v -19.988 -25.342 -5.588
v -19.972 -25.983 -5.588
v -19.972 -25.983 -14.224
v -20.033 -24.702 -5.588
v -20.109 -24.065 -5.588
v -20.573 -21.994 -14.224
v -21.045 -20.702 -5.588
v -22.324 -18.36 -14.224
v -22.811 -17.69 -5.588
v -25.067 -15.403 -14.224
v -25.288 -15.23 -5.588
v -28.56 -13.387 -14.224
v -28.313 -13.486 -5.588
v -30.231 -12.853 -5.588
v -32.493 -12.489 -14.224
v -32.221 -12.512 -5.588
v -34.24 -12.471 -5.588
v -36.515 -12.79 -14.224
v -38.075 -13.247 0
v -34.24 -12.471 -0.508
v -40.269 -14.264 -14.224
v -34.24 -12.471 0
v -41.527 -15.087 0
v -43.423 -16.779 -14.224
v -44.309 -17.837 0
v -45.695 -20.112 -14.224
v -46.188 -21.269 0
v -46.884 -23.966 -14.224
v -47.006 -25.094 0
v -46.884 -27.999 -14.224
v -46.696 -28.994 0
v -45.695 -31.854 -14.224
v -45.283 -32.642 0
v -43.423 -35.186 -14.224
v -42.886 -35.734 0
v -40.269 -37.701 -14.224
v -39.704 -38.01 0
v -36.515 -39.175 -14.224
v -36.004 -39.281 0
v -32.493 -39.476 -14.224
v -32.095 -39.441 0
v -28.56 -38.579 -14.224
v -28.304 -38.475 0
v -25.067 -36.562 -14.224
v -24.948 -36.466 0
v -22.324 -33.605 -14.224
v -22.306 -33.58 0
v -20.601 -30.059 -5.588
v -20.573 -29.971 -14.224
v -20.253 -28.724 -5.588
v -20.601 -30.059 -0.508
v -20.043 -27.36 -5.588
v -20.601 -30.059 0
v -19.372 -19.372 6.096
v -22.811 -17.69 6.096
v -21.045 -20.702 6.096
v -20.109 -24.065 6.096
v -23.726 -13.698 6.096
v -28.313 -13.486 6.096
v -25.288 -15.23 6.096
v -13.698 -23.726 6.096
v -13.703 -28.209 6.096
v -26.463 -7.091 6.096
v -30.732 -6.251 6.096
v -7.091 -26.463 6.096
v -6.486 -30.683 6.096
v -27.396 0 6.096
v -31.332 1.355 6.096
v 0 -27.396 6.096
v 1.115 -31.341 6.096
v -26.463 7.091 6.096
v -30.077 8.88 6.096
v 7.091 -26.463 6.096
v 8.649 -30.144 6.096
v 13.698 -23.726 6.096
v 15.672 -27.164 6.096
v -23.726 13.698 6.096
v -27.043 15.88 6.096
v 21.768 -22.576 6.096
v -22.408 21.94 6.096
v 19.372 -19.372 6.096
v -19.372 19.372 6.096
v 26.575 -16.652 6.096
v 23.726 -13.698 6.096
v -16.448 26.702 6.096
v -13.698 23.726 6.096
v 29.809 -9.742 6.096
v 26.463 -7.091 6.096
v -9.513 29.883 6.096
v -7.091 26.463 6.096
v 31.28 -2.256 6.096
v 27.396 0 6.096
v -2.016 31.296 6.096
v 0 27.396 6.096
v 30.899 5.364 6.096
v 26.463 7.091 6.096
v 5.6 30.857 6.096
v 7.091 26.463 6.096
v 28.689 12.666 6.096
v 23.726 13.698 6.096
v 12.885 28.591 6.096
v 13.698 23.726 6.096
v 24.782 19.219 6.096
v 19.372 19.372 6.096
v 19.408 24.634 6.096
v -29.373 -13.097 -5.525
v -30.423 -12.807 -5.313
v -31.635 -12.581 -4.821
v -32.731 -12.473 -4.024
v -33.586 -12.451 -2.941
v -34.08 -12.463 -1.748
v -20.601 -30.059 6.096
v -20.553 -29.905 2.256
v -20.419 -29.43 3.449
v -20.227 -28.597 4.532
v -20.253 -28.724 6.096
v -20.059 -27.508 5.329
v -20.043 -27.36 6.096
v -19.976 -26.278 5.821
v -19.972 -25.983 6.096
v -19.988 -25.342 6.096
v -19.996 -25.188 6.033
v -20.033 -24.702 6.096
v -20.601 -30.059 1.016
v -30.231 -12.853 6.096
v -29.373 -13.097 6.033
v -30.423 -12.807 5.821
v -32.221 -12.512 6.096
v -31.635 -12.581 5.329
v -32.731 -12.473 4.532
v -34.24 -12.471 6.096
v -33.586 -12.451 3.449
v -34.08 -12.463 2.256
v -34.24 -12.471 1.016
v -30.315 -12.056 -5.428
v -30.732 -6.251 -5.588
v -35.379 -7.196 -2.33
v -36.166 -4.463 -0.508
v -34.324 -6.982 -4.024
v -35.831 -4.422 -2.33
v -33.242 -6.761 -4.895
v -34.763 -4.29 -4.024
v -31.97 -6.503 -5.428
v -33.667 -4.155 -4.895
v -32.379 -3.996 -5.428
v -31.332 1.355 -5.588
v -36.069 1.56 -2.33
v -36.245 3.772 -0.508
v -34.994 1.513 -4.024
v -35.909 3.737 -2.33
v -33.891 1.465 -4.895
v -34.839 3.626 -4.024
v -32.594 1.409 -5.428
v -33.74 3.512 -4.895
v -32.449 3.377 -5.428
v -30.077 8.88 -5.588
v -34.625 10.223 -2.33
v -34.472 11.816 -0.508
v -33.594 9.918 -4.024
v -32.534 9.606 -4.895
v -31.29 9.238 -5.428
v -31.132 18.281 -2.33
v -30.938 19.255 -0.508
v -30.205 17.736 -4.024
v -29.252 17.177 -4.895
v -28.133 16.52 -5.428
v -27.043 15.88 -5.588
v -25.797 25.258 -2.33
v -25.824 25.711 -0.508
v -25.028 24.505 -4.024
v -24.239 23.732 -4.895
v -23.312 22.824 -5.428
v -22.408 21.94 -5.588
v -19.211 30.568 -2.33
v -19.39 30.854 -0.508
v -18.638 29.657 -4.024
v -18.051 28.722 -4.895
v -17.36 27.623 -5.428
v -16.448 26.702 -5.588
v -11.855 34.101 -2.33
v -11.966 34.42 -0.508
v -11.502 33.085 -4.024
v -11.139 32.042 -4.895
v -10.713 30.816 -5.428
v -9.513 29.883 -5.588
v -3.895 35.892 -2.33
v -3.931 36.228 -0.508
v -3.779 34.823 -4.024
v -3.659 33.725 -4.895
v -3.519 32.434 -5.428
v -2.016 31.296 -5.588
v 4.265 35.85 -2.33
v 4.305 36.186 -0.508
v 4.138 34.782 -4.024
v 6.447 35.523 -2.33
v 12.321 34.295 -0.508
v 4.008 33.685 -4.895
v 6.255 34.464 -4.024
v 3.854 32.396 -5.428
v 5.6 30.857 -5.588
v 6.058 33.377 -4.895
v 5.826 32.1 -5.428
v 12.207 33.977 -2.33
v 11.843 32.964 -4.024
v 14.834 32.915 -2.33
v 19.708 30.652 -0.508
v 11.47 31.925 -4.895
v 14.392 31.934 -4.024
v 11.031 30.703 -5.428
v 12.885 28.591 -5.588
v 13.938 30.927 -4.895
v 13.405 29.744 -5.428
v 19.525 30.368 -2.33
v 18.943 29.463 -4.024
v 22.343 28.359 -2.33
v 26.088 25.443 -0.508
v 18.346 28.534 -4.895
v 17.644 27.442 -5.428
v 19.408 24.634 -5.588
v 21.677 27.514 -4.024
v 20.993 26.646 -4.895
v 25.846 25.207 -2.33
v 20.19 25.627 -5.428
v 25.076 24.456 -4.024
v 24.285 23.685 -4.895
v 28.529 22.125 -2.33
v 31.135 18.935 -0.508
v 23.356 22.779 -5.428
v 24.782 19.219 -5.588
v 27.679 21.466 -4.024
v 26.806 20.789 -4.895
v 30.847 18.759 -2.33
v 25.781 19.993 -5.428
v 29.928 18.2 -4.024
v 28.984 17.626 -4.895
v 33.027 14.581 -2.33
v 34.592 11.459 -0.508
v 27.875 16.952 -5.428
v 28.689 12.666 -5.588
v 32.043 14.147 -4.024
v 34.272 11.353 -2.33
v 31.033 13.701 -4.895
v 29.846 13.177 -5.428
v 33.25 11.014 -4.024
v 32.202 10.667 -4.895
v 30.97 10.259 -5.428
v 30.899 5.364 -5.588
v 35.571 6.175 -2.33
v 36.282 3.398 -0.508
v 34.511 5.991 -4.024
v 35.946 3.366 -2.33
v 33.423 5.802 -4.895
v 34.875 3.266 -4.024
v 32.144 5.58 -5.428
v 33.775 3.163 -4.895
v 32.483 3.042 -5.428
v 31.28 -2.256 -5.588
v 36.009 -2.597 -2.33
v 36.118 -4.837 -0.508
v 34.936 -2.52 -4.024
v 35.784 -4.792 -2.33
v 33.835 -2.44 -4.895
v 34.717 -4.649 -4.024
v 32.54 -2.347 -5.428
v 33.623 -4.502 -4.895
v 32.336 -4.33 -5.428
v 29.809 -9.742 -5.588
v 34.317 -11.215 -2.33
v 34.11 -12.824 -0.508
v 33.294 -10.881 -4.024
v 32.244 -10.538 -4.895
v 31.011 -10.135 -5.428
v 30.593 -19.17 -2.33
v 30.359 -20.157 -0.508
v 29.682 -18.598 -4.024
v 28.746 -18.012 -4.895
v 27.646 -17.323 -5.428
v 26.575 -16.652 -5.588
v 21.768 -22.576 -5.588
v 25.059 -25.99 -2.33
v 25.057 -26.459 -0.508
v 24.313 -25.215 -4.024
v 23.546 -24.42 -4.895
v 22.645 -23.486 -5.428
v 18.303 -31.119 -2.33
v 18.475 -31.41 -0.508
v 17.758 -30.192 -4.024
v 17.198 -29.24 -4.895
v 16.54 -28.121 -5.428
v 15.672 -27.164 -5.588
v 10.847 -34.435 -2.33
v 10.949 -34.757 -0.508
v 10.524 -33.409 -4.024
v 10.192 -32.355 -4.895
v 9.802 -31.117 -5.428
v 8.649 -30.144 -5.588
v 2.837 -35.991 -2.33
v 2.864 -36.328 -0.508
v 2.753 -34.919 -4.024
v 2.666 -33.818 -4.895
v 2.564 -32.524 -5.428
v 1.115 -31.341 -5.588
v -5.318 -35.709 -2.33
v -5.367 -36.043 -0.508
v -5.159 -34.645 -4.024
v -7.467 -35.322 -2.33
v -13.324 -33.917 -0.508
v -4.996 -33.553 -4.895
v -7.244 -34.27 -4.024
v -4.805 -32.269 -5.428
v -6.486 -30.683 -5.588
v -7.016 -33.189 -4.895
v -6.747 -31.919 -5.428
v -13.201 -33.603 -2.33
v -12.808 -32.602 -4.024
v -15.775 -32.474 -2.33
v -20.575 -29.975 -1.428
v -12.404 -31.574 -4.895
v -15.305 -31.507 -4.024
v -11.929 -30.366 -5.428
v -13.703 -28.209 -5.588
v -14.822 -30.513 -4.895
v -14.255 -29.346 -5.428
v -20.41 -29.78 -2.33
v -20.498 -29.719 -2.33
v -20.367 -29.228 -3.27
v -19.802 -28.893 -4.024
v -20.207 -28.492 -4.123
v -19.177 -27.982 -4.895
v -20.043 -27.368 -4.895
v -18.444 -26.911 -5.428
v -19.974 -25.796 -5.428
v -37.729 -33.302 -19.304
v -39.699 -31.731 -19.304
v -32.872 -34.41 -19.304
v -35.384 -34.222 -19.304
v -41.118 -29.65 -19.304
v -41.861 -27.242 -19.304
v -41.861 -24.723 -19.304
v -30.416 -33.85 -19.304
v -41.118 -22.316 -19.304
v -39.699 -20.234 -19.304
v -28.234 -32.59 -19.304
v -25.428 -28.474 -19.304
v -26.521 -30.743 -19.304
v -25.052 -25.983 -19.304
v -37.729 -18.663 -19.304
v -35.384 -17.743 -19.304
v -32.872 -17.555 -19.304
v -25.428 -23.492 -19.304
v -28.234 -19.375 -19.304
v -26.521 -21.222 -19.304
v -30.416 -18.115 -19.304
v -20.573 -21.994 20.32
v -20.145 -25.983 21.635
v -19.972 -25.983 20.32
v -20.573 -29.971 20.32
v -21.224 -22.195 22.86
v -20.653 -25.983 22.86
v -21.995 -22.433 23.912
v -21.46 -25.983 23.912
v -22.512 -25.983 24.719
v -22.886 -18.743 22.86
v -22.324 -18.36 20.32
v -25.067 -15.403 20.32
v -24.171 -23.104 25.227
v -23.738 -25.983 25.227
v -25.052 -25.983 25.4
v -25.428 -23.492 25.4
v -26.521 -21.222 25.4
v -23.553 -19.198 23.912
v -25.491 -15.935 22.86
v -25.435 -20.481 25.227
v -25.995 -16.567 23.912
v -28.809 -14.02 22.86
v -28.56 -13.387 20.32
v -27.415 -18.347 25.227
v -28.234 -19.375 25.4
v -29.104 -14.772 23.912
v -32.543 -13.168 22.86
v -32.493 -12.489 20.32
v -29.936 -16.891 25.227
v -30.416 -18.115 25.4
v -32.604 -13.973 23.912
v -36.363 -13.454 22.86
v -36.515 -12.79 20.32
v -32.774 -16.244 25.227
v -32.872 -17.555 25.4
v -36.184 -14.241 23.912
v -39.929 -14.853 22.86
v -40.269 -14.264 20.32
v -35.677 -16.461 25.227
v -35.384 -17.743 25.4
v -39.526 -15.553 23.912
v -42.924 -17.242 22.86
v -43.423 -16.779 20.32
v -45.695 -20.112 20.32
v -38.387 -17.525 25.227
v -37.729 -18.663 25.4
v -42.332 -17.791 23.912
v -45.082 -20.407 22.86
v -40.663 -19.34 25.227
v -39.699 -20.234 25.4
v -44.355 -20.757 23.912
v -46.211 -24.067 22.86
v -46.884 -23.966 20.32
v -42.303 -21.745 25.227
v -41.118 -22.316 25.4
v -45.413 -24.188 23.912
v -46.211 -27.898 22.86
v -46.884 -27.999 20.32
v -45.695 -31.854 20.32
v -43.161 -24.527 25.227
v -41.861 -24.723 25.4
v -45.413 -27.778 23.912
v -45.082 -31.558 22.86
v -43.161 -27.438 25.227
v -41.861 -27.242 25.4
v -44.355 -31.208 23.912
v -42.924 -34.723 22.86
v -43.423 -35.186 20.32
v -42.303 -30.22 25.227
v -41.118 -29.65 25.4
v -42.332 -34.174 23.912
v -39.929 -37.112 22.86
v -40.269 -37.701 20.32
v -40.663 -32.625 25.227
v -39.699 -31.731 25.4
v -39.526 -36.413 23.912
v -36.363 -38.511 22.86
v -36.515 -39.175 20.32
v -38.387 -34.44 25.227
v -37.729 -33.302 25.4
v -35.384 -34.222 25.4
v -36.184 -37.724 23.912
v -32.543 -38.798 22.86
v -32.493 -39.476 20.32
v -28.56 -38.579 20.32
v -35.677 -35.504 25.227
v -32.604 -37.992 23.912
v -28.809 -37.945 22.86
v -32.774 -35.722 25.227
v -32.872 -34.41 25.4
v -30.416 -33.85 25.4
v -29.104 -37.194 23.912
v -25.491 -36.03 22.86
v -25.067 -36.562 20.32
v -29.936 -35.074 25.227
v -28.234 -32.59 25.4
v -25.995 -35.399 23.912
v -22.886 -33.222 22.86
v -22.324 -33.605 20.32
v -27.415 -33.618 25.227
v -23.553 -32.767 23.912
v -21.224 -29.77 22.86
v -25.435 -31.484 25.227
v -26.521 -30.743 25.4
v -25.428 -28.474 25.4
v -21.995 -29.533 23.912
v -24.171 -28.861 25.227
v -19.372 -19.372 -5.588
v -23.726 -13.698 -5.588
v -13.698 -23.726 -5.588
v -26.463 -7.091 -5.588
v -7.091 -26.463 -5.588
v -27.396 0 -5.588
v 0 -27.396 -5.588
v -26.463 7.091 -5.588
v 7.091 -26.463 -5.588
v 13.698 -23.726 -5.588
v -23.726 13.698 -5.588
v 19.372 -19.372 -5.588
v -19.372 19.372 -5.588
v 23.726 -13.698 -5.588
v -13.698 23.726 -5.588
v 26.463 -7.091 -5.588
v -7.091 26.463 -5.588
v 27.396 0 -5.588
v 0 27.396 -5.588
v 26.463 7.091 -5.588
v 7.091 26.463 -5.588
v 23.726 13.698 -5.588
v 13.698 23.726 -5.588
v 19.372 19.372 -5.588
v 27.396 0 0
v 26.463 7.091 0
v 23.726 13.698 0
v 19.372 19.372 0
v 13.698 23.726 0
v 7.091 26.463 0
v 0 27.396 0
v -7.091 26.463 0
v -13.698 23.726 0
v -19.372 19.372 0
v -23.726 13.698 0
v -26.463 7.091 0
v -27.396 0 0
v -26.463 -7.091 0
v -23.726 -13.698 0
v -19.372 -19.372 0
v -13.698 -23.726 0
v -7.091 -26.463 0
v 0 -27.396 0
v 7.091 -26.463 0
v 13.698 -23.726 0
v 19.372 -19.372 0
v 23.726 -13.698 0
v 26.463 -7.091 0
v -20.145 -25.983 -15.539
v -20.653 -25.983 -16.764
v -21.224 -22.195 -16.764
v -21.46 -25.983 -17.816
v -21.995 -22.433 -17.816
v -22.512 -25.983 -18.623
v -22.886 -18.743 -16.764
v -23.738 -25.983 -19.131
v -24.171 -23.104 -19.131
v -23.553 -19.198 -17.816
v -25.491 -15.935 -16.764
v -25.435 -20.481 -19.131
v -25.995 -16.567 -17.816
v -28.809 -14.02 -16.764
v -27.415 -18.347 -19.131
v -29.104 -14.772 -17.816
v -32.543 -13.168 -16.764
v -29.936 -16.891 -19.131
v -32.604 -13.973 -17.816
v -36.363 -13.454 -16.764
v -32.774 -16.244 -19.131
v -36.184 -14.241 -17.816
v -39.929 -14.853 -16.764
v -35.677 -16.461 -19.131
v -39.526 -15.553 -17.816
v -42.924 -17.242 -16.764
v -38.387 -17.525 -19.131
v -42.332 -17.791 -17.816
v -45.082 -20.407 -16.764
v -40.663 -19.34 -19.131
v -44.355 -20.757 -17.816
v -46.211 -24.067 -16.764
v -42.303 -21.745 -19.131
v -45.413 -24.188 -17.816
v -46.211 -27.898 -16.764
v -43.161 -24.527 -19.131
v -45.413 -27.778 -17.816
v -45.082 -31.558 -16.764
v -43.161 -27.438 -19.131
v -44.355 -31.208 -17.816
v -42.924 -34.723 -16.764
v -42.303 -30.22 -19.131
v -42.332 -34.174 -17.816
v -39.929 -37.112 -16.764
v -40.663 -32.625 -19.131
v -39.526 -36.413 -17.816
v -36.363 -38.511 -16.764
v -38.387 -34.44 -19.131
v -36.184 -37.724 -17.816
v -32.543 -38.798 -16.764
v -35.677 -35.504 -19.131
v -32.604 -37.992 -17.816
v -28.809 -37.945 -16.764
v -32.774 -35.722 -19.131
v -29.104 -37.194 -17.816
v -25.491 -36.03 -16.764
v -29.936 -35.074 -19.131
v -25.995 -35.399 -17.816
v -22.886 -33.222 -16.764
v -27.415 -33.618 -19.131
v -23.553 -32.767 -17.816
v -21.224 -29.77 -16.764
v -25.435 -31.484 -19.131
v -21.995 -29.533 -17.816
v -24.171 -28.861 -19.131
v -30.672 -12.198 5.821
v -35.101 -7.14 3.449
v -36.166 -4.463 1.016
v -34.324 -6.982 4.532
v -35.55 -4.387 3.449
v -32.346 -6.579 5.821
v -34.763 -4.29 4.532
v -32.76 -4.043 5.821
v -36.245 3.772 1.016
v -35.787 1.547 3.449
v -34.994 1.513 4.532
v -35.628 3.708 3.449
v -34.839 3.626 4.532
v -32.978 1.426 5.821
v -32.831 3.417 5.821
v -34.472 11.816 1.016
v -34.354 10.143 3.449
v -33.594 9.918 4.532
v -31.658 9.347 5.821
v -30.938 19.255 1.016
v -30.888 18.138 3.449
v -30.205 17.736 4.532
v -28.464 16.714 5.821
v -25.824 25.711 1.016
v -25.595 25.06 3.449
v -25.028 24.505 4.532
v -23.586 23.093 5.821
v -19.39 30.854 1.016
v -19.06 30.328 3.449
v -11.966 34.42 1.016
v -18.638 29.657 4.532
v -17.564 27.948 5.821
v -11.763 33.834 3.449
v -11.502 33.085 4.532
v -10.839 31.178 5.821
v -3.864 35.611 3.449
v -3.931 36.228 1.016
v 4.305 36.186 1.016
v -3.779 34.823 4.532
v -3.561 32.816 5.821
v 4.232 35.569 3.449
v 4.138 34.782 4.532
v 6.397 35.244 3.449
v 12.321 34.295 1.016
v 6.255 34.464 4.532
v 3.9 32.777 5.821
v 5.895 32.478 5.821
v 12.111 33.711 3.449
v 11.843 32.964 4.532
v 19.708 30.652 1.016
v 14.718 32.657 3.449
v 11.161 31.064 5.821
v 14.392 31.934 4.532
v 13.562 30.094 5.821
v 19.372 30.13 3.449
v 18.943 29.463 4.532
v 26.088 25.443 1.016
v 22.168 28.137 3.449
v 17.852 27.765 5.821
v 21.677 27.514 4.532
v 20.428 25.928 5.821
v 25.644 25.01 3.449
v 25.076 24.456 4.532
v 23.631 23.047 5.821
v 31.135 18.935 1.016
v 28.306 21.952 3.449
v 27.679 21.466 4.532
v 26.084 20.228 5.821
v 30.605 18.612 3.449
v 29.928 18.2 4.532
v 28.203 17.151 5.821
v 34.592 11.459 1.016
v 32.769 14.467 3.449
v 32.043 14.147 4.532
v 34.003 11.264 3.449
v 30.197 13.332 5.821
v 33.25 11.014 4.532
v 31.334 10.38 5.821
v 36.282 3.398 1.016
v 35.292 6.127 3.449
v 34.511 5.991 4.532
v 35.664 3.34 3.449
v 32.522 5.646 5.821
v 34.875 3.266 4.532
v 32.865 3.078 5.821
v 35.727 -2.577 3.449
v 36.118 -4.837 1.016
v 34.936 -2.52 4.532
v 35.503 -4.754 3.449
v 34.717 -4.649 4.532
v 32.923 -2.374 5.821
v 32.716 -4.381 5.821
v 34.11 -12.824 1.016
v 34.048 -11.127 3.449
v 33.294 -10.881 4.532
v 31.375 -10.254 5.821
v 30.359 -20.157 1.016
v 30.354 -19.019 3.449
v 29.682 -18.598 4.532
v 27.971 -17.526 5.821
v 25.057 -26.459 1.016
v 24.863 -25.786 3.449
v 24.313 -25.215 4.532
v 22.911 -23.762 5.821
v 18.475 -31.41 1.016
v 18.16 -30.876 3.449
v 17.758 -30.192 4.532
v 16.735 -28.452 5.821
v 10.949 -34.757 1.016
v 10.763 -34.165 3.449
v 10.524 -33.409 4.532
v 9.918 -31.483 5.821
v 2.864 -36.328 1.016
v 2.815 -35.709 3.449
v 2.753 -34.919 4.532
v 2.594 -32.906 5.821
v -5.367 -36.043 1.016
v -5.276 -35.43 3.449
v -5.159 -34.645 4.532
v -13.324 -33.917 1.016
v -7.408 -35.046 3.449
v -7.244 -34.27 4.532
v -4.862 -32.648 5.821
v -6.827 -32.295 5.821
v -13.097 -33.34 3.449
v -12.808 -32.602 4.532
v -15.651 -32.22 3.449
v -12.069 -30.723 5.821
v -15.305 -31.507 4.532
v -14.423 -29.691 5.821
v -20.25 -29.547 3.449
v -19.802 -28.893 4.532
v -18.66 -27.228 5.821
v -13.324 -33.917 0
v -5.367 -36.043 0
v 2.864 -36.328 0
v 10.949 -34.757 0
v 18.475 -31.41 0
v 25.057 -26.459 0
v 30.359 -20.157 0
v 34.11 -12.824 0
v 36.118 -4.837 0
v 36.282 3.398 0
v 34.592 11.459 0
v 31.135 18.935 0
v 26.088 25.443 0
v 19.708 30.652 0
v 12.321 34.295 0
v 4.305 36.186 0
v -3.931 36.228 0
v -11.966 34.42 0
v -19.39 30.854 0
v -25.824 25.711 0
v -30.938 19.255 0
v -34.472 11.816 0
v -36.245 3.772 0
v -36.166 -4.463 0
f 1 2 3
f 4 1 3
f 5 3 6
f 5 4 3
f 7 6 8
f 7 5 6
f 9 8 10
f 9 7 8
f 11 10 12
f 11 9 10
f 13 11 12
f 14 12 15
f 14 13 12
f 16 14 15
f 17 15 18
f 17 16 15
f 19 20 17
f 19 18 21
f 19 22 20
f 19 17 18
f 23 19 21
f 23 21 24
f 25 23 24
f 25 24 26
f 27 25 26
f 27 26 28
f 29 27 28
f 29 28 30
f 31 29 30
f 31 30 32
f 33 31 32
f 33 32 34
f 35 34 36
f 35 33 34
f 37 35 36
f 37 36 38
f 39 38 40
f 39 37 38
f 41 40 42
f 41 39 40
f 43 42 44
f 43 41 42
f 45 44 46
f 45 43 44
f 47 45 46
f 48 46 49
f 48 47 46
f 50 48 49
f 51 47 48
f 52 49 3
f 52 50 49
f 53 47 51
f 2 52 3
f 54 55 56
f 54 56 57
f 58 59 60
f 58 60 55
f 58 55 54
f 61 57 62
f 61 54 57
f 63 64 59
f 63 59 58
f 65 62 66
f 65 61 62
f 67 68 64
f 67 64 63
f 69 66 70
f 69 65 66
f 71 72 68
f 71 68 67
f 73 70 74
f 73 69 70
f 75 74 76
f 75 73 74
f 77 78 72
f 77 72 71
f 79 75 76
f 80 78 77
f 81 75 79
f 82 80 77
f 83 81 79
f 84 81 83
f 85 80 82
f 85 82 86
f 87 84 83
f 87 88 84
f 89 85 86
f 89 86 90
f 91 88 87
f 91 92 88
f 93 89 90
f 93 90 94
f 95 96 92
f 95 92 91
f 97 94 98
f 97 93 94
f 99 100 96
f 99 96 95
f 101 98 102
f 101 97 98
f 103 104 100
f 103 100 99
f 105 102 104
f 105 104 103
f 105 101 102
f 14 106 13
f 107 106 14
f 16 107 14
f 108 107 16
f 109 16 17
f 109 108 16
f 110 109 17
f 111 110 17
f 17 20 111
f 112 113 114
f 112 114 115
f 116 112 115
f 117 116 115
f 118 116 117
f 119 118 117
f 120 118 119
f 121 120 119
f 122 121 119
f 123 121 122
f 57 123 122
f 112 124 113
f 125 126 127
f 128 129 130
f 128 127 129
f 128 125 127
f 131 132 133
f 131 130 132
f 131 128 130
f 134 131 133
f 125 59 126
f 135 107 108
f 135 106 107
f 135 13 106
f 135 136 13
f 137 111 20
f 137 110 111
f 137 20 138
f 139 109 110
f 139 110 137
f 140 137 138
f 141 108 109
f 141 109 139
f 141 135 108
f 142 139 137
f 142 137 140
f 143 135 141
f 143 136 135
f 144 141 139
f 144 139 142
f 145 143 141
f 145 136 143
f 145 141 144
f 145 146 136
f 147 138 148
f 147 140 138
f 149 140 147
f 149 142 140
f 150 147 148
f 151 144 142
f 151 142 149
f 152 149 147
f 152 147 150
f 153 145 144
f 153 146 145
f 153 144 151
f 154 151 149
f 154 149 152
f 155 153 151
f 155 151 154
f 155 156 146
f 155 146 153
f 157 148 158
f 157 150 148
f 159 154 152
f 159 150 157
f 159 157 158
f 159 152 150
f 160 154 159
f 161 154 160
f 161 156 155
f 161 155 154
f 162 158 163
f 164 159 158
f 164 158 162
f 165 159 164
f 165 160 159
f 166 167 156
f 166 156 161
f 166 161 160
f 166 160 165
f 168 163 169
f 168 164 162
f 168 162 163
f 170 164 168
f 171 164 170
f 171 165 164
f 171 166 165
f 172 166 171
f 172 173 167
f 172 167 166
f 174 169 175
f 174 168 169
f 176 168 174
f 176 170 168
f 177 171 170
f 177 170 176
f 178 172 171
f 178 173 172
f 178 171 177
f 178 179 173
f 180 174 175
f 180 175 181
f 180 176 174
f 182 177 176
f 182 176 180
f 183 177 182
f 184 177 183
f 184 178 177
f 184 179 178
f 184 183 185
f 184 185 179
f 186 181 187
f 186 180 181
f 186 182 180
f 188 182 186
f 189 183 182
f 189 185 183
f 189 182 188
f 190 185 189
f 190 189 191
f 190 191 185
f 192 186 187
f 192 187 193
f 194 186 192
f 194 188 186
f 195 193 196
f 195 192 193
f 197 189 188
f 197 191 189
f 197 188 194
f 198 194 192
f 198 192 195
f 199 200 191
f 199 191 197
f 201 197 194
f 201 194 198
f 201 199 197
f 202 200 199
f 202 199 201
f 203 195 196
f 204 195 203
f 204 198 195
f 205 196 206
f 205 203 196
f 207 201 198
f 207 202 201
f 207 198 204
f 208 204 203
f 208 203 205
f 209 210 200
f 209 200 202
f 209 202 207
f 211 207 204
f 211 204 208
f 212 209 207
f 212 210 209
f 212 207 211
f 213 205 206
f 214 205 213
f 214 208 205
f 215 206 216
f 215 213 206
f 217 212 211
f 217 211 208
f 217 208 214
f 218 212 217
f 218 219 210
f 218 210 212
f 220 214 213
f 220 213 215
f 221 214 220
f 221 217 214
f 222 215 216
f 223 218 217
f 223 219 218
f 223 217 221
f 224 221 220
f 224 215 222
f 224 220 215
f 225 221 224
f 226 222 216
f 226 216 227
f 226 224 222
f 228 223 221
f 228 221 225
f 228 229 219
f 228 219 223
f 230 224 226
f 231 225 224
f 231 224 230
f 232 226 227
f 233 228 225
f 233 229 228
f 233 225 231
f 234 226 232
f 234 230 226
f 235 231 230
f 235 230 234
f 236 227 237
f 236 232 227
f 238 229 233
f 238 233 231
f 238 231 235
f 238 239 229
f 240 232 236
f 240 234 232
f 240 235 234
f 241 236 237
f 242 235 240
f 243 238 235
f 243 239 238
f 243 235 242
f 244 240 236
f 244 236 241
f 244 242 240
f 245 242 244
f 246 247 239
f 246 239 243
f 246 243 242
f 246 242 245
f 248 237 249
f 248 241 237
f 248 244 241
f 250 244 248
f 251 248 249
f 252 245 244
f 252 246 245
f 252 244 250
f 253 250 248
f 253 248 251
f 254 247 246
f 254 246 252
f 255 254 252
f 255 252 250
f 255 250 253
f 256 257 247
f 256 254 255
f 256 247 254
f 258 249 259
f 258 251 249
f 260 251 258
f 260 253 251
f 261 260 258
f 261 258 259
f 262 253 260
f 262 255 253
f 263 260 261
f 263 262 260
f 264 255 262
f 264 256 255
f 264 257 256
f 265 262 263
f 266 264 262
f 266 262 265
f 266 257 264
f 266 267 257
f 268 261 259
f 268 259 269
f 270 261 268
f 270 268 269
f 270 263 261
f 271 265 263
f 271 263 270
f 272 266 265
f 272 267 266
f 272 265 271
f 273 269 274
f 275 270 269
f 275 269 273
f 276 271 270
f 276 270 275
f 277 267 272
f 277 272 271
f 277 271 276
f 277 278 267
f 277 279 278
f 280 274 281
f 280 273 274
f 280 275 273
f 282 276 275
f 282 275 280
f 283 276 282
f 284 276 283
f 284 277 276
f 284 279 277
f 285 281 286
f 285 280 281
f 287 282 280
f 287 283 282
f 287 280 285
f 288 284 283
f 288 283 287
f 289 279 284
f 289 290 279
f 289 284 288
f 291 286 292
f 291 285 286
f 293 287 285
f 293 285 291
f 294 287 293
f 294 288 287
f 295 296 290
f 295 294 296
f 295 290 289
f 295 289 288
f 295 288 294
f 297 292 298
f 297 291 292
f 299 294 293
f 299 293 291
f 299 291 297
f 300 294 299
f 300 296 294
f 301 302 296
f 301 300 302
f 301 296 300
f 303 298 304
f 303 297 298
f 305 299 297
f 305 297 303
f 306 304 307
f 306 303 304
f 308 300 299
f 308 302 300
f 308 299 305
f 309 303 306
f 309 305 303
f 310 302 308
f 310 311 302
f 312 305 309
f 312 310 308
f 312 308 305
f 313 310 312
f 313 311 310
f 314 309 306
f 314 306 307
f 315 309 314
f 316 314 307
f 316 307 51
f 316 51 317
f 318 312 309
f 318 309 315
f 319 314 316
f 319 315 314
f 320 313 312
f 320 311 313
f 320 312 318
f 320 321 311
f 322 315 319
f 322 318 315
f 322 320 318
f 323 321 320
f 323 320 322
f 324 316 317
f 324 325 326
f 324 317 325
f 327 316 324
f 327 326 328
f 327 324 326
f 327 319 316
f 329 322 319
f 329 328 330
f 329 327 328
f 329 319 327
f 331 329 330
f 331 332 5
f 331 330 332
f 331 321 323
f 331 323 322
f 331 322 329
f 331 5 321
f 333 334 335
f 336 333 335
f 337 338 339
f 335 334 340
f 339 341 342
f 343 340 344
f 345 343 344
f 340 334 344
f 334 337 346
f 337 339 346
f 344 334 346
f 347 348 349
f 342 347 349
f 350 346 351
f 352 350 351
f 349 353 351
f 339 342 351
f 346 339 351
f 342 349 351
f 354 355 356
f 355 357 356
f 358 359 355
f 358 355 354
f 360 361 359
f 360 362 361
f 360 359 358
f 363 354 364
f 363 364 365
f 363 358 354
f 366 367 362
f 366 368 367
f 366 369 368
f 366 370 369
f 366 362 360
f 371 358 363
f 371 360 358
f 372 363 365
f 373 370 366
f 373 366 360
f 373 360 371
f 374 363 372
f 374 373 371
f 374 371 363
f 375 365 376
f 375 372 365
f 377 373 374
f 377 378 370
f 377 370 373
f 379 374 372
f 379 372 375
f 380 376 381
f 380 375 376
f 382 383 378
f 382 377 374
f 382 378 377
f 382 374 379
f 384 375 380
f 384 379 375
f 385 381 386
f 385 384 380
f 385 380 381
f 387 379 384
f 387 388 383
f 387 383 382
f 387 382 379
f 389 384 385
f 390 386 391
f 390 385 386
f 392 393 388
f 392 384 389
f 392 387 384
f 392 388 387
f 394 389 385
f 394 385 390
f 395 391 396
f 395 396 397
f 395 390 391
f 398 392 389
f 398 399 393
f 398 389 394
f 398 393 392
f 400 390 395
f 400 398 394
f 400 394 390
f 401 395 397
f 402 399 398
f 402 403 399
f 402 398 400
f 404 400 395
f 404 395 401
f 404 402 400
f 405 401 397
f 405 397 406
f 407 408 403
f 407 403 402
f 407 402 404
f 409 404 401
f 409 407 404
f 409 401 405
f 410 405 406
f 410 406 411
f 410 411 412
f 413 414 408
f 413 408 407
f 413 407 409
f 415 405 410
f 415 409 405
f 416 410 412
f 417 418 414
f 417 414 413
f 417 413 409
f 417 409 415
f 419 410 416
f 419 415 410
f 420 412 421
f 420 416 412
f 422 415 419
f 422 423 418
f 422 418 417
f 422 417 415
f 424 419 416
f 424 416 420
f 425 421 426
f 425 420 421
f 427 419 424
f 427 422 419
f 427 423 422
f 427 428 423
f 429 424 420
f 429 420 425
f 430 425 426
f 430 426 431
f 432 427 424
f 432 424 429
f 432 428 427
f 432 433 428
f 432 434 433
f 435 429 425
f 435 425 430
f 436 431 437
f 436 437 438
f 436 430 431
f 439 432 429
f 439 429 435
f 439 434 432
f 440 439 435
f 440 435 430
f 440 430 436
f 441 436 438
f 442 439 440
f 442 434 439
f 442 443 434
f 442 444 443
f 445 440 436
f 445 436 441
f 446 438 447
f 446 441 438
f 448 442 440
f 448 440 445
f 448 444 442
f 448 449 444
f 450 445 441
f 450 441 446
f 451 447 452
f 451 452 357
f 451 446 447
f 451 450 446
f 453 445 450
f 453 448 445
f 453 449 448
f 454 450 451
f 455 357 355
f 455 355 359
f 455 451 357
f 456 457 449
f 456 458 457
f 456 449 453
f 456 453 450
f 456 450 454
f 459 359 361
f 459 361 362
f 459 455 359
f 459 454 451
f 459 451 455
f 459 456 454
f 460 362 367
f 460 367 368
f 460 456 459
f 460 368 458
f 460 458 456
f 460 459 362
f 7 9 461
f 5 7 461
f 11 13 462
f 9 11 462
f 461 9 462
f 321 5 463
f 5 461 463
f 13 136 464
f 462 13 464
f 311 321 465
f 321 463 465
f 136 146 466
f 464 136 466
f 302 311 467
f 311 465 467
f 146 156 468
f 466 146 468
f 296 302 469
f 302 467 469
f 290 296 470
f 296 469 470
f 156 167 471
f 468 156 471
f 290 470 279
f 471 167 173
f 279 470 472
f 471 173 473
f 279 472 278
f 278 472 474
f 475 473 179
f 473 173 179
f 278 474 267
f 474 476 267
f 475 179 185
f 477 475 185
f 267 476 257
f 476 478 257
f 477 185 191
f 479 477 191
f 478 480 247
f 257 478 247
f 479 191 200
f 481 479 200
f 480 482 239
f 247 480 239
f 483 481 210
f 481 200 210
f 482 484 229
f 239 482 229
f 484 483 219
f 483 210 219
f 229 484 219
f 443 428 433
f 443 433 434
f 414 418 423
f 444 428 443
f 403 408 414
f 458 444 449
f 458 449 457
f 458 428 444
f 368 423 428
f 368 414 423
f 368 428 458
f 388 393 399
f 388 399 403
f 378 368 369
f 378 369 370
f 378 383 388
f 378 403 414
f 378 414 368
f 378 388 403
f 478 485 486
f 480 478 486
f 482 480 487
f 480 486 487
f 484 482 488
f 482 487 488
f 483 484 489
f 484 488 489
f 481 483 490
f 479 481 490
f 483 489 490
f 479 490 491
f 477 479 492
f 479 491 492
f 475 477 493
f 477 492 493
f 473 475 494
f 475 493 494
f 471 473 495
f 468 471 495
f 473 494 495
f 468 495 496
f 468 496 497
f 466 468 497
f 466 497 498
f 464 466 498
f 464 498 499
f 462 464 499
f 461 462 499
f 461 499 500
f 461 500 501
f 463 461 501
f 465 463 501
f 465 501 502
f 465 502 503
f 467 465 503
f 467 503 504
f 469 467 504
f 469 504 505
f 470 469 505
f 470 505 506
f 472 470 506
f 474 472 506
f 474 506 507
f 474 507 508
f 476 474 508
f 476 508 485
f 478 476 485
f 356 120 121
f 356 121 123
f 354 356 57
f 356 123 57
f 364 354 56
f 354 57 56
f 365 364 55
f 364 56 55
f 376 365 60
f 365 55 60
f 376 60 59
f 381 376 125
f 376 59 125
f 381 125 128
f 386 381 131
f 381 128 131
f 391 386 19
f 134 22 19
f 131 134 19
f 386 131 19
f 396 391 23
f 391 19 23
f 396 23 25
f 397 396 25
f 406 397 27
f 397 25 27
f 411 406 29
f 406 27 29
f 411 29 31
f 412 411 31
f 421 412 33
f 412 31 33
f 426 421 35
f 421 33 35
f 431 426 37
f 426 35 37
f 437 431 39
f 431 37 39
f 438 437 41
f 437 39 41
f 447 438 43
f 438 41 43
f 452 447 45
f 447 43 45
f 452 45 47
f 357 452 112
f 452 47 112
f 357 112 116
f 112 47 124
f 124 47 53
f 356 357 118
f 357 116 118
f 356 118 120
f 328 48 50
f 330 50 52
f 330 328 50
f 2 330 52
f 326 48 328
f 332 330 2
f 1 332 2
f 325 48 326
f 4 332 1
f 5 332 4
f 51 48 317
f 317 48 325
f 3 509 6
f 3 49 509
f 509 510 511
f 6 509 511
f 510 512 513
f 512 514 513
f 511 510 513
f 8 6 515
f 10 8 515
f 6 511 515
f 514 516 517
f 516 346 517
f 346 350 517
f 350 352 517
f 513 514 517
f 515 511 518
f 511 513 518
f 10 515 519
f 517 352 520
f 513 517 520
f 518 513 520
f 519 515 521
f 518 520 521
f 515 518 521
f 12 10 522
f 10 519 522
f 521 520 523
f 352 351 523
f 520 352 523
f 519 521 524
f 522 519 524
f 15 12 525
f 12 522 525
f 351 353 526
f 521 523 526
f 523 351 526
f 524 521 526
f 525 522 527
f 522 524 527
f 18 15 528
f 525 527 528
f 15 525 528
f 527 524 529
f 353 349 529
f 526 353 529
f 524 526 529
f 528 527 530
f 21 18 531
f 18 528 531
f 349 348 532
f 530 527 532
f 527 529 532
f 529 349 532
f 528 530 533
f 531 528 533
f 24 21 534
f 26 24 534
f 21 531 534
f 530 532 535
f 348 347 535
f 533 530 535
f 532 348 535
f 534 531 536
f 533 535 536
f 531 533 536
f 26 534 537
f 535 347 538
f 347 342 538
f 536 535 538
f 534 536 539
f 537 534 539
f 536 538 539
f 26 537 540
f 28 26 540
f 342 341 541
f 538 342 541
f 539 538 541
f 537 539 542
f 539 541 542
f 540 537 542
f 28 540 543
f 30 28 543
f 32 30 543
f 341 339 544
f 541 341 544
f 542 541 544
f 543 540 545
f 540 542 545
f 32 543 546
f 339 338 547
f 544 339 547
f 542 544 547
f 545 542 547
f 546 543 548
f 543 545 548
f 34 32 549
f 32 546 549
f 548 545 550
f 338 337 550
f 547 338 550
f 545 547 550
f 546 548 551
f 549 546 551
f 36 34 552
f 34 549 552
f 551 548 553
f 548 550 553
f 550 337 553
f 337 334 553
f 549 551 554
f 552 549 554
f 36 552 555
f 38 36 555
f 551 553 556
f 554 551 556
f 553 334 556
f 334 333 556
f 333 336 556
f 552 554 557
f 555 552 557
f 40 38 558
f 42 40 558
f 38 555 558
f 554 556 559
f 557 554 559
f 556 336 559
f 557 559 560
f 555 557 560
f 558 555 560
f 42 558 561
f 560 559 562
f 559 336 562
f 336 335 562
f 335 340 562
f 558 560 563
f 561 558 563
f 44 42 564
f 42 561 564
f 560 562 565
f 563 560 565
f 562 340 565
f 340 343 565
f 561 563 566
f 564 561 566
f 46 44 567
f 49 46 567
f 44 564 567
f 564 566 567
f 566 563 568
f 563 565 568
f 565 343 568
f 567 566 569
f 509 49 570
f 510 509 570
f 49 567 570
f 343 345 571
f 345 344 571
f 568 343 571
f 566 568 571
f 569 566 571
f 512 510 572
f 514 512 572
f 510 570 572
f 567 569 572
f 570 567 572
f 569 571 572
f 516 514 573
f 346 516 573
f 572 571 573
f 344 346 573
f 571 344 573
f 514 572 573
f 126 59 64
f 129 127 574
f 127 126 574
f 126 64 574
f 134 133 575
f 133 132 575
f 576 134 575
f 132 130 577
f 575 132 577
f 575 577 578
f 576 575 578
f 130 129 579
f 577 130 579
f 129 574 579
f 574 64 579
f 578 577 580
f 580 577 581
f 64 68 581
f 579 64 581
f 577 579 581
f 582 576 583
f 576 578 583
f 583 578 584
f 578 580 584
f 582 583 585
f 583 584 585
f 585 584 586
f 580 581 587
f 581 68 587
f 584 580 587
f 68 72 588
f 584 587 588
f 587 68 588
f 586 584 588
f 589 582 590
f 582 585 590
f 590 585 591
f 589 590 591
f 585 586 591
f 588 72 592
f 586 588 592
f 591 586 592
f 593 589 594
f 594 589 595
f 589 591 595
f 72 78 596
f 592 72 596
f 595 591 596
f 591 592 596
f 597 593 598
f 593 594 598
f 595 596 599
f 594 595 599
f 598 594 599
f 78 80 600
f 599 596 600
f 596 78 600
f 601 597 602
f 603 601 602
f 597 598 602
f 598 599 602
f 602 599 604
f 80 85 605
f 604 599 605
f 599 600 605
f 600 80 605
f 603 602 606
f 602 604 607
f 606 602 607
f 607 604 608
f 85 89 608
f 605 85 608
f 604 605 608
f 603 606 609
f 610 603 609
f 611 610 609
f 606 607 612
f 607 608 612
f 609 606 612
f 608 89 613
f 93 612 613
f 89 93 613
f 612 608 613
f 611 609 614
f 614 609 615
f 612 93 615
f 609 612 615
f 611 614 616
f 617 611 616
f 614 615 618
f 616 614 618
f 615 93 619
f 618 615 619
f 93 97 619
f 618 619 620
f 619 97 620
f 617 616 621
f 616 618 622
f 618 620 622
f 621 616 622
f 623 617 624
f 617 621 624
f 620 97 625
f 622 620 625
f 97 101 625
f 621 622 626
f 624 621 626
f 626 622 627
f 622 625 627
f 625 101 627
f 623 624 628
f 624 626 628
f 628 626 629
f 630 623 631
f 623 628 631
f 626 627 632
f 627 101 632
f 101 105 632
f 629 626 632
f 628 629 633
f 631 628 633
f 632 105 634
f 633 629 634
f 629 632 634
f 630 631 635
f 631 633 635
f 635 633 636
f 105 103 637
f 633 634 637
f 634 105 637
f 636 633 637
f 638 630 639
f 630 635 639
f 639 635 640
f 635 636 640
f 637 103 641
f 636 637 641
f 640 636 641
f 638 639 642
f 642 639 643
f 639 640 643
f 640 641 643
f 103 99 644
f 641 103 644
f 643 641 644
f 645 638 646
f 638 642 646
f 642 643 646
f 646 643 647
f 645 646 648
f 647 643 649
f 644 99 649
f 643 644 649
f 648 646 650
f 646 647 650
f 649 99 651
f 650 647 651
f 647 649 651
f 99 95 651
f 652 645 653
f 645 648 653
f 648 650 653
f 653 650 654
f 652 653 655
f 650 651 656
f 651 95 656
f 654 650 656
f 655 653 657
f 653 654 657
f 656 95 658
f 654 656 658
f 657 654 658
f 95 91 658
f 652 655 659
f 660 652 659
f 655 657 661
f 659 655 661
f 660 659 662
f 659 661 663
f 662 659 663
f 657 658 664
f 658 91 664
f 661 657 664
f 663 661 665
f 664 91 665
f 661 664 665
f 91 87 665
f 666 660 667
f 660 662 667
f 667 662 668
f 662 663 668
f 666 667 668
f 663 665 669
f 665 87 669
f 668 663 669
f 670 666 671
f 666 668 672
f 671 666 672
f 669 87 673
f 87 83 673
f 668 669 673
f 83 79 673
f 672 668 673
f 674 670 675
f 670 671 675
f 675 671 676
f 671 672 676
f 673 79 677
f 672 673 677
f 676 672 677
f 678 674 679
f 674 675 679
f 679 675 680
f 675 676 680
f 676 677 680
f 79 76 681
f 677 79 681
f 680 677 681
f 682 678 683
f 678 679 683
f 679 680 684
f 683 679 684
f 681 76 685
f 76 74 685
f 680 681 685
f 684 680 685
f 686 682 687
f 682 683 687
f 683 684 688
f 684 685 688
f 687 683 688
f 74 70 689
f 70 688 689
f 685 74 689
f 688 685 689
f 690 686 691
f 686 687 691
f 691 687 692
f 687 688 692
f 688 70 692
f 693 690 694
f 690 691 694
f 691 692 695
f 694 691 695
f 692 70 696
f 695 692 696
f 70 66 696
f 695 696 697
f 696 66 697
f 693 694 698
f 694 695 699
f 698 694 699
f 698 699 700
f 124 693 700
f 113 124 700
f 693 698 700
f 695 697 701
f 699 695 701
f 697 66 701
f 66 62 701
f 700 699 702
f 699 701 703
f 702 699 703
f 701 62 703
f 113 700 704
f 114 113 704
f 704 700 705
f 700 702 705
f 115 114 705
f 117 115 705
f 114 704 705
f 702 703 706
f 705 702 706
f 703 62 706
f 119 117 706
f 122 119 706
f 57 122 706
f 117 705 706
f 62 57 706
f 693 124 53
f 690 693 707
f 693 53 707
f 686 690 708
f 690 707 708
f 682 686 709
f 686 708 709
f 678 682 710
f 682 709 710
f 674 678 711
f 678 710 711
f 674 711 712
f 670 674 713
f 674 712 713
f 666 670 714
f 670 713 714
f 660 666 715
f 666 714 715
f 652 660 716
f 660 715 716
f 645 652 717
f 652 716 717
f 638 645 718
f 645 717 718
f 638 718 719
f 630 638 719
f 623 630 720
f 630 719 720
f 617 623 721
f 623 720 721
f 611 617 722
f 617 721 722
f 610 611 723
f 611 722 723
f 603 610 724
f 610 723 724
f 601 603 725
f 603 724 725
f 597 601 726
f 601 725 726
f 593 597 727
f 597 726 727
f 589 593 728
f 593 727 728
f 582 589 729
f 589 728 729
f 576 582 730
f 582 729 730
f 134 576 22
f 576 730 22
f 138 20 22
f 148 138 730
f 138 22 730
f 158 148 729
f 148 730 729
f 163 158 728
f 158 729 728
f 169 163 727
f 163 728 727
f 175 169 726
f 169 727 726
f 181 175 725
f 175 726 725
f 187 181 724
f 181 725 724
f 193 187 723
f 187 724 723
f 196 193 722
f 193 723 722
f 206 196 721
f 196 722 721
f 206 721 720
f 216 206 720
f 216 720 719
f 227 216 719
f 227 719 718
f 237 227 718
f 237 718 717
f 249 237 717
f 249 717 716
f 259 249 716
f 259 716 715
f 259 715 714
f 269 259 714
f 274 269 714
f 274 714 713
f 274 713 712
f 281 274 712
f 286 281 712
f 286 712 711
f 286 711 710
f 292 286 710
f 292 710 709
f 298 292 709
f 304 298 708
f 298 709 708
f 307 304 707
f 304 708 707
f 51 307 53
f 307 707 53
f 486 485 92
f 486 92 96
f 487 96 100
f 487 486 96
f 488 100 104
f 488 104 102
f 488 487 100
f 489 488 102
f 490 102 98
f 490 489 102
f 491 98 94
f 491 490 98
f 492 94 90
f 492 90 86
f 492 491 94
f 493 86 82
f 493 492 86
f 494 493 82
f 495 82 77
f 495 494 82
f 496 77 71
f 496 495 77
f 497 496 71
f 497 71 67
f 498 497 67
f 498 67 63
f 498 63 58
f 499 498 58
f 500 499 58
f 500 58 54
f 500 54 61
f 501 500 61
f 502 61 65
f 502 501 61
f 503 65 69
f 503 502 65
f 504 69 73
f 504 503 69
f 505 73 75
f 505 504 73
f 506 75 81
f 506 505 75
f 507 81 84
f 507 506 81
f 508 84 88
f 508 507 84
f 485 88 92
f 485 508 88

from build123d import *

# Parameters (mm, degrees)
F0_R          = 36.4407990547
F0_R_2        = 27.3961880776
F1_DEPTH      = 6.096
F2_R          = 13.5314507832
F3_DEPTH      = 25.4
F3_DEPTH_BACK = 19.304
F4_R          = 5.08
F5_DEPTH      = 11.684
F6_T4_ANGLE   = 359.64
F6_S5_R       = 13.5314507832
F6_T6_DEPTH   = 57
F6_T10_ANGLE  = 359.64
F6_S11_R      = 13.5314507832
F6_T12_DEPTH  = 57


# Not quite as in the source:
# - a fillet or chamfer that OpenCascade refuses, or shapes differently, is made with other operations: its cross-section is extruded or revolved along the edge and cut away or added


with BuildPart() as f1:
    # F0 (on Top) → F1 (new body)
    with BuildSketch(Plane.XY):
        Circle(F0_R)
        Circle(F0_R_2, mode=Mode.SUBTRACT)
    extrude(amount=F1_DEPTH)

    # F2 (on Top) → F3 (join, two sides)
    with BuildSketch(Plane.XY) as f3_sk:
        with Locations((-33.5037633777, -25.9826220572)):
            Circle(F2_R)
    extrude(amount=F3_DEPTH)
    extrude(f3_sk.sketch, amount=-F3_DEPTH_BACK)

    # F4
    f4_edges = [f1.edges().sort_by_distance(p)[0] for p in [
        (-47.035214, -25.982622, 25.4),
        (-47.035214, -25.982622, -19.304),
    ]]
    fillet(f4_edges, radius=F4_R)

    # F5 (add): a face of the model
    f5_faces = [f1.faces().sort_by_distance(p)[0] for p in [
        (-19.1117163602, -28.201914774, 6.096),
    ]]
    extrude(f5_faces, amount=-F5_DEPTH)

    # F6: fillet of radius 5.08 on 2 edges, made by hand


with BuildPart() as f6_tool2:
    # F6_s3 → F6_t4 (revolve)
    with BuildSketch(Plane(origin=(0, 0, 0), x_dir=(0, 0, 1), z_dir=(0.6103395994, -0.7921398699, 0))):
        with BuildLine():
            ThreePointArc((-0.508, 36.4407990547), (-4.1001024484, 34.9529015031), (-5.588, 31.3607990547))
            Line((-5.588, 31.3607990547), (-5.588, 36.4407990547))
            Line((-5.588, 36.4407990547), (-0.508, 36.4407990547))
        make_face()
    revolve(axis=Axis((0, 0, -5.588), (0, 0, -1)), revolution_arc=F6_T4_ANGLE)

    # F6_s5 → F6_t6 (cut, symmetric)
    with BuildSketch(Plane.XY.offset(-3)):
        with Locations((-33.5037633777, -25.9826220572)):
            Circle(F6_S5_R)
    extrude(amount=F6_T6_DEPTH, both=True, mode=Mode.SUBTRACT)


with BuildPart() as f1_1:
    add(f1.part)

    # F6_t1: cut F6_tool2
    add(f6_tool2.part, mode=Mode.SUBTRACT)


with BuildPart() as f6_tool8:
    # F6_s9 → F6_t10 (revolve)
    with BuildSketch(Plane(origin=(0, 0, 0), x_dir=(0, 0, 1), z_dir=(0.6103395994, -0.7921398699, 0))):
        with BuildLine():
            ThreePointArc((1.016, 36.4407990547), (4.6081024484, 34.9529015031), (6.096, 31.3607990547))
            Line((6.096, 31.3607990547), (6.096, 36.4407990547))
            Line((6.096, 36.4407990547), (1.016, 36.4407990547))
        make_face()
    revolve(axis=Axis((0, 0, 6.096), (0, 0, -1)), revolution_arc=F6_T10_ANGLE)

    # F6_s11 → F6_t12 (cut, symmetric)
    with BuildSketch(Plane.XY.offset(3.6)):
        with Locations((-33.5037633777, -25.9826220572)):
            Circle(F6_S11_R)
    extrude(amount=F6_T12_DEPTH, both=True, mode=Mode.SUBTRACT)


with BuildPart() as f1_2:
    add(f1_1.part)

    # F6_t7: cut F6_tool8
    add(f6_tool8.part, mode=Mode.SUBTRACT)


solid = f1_2.part
